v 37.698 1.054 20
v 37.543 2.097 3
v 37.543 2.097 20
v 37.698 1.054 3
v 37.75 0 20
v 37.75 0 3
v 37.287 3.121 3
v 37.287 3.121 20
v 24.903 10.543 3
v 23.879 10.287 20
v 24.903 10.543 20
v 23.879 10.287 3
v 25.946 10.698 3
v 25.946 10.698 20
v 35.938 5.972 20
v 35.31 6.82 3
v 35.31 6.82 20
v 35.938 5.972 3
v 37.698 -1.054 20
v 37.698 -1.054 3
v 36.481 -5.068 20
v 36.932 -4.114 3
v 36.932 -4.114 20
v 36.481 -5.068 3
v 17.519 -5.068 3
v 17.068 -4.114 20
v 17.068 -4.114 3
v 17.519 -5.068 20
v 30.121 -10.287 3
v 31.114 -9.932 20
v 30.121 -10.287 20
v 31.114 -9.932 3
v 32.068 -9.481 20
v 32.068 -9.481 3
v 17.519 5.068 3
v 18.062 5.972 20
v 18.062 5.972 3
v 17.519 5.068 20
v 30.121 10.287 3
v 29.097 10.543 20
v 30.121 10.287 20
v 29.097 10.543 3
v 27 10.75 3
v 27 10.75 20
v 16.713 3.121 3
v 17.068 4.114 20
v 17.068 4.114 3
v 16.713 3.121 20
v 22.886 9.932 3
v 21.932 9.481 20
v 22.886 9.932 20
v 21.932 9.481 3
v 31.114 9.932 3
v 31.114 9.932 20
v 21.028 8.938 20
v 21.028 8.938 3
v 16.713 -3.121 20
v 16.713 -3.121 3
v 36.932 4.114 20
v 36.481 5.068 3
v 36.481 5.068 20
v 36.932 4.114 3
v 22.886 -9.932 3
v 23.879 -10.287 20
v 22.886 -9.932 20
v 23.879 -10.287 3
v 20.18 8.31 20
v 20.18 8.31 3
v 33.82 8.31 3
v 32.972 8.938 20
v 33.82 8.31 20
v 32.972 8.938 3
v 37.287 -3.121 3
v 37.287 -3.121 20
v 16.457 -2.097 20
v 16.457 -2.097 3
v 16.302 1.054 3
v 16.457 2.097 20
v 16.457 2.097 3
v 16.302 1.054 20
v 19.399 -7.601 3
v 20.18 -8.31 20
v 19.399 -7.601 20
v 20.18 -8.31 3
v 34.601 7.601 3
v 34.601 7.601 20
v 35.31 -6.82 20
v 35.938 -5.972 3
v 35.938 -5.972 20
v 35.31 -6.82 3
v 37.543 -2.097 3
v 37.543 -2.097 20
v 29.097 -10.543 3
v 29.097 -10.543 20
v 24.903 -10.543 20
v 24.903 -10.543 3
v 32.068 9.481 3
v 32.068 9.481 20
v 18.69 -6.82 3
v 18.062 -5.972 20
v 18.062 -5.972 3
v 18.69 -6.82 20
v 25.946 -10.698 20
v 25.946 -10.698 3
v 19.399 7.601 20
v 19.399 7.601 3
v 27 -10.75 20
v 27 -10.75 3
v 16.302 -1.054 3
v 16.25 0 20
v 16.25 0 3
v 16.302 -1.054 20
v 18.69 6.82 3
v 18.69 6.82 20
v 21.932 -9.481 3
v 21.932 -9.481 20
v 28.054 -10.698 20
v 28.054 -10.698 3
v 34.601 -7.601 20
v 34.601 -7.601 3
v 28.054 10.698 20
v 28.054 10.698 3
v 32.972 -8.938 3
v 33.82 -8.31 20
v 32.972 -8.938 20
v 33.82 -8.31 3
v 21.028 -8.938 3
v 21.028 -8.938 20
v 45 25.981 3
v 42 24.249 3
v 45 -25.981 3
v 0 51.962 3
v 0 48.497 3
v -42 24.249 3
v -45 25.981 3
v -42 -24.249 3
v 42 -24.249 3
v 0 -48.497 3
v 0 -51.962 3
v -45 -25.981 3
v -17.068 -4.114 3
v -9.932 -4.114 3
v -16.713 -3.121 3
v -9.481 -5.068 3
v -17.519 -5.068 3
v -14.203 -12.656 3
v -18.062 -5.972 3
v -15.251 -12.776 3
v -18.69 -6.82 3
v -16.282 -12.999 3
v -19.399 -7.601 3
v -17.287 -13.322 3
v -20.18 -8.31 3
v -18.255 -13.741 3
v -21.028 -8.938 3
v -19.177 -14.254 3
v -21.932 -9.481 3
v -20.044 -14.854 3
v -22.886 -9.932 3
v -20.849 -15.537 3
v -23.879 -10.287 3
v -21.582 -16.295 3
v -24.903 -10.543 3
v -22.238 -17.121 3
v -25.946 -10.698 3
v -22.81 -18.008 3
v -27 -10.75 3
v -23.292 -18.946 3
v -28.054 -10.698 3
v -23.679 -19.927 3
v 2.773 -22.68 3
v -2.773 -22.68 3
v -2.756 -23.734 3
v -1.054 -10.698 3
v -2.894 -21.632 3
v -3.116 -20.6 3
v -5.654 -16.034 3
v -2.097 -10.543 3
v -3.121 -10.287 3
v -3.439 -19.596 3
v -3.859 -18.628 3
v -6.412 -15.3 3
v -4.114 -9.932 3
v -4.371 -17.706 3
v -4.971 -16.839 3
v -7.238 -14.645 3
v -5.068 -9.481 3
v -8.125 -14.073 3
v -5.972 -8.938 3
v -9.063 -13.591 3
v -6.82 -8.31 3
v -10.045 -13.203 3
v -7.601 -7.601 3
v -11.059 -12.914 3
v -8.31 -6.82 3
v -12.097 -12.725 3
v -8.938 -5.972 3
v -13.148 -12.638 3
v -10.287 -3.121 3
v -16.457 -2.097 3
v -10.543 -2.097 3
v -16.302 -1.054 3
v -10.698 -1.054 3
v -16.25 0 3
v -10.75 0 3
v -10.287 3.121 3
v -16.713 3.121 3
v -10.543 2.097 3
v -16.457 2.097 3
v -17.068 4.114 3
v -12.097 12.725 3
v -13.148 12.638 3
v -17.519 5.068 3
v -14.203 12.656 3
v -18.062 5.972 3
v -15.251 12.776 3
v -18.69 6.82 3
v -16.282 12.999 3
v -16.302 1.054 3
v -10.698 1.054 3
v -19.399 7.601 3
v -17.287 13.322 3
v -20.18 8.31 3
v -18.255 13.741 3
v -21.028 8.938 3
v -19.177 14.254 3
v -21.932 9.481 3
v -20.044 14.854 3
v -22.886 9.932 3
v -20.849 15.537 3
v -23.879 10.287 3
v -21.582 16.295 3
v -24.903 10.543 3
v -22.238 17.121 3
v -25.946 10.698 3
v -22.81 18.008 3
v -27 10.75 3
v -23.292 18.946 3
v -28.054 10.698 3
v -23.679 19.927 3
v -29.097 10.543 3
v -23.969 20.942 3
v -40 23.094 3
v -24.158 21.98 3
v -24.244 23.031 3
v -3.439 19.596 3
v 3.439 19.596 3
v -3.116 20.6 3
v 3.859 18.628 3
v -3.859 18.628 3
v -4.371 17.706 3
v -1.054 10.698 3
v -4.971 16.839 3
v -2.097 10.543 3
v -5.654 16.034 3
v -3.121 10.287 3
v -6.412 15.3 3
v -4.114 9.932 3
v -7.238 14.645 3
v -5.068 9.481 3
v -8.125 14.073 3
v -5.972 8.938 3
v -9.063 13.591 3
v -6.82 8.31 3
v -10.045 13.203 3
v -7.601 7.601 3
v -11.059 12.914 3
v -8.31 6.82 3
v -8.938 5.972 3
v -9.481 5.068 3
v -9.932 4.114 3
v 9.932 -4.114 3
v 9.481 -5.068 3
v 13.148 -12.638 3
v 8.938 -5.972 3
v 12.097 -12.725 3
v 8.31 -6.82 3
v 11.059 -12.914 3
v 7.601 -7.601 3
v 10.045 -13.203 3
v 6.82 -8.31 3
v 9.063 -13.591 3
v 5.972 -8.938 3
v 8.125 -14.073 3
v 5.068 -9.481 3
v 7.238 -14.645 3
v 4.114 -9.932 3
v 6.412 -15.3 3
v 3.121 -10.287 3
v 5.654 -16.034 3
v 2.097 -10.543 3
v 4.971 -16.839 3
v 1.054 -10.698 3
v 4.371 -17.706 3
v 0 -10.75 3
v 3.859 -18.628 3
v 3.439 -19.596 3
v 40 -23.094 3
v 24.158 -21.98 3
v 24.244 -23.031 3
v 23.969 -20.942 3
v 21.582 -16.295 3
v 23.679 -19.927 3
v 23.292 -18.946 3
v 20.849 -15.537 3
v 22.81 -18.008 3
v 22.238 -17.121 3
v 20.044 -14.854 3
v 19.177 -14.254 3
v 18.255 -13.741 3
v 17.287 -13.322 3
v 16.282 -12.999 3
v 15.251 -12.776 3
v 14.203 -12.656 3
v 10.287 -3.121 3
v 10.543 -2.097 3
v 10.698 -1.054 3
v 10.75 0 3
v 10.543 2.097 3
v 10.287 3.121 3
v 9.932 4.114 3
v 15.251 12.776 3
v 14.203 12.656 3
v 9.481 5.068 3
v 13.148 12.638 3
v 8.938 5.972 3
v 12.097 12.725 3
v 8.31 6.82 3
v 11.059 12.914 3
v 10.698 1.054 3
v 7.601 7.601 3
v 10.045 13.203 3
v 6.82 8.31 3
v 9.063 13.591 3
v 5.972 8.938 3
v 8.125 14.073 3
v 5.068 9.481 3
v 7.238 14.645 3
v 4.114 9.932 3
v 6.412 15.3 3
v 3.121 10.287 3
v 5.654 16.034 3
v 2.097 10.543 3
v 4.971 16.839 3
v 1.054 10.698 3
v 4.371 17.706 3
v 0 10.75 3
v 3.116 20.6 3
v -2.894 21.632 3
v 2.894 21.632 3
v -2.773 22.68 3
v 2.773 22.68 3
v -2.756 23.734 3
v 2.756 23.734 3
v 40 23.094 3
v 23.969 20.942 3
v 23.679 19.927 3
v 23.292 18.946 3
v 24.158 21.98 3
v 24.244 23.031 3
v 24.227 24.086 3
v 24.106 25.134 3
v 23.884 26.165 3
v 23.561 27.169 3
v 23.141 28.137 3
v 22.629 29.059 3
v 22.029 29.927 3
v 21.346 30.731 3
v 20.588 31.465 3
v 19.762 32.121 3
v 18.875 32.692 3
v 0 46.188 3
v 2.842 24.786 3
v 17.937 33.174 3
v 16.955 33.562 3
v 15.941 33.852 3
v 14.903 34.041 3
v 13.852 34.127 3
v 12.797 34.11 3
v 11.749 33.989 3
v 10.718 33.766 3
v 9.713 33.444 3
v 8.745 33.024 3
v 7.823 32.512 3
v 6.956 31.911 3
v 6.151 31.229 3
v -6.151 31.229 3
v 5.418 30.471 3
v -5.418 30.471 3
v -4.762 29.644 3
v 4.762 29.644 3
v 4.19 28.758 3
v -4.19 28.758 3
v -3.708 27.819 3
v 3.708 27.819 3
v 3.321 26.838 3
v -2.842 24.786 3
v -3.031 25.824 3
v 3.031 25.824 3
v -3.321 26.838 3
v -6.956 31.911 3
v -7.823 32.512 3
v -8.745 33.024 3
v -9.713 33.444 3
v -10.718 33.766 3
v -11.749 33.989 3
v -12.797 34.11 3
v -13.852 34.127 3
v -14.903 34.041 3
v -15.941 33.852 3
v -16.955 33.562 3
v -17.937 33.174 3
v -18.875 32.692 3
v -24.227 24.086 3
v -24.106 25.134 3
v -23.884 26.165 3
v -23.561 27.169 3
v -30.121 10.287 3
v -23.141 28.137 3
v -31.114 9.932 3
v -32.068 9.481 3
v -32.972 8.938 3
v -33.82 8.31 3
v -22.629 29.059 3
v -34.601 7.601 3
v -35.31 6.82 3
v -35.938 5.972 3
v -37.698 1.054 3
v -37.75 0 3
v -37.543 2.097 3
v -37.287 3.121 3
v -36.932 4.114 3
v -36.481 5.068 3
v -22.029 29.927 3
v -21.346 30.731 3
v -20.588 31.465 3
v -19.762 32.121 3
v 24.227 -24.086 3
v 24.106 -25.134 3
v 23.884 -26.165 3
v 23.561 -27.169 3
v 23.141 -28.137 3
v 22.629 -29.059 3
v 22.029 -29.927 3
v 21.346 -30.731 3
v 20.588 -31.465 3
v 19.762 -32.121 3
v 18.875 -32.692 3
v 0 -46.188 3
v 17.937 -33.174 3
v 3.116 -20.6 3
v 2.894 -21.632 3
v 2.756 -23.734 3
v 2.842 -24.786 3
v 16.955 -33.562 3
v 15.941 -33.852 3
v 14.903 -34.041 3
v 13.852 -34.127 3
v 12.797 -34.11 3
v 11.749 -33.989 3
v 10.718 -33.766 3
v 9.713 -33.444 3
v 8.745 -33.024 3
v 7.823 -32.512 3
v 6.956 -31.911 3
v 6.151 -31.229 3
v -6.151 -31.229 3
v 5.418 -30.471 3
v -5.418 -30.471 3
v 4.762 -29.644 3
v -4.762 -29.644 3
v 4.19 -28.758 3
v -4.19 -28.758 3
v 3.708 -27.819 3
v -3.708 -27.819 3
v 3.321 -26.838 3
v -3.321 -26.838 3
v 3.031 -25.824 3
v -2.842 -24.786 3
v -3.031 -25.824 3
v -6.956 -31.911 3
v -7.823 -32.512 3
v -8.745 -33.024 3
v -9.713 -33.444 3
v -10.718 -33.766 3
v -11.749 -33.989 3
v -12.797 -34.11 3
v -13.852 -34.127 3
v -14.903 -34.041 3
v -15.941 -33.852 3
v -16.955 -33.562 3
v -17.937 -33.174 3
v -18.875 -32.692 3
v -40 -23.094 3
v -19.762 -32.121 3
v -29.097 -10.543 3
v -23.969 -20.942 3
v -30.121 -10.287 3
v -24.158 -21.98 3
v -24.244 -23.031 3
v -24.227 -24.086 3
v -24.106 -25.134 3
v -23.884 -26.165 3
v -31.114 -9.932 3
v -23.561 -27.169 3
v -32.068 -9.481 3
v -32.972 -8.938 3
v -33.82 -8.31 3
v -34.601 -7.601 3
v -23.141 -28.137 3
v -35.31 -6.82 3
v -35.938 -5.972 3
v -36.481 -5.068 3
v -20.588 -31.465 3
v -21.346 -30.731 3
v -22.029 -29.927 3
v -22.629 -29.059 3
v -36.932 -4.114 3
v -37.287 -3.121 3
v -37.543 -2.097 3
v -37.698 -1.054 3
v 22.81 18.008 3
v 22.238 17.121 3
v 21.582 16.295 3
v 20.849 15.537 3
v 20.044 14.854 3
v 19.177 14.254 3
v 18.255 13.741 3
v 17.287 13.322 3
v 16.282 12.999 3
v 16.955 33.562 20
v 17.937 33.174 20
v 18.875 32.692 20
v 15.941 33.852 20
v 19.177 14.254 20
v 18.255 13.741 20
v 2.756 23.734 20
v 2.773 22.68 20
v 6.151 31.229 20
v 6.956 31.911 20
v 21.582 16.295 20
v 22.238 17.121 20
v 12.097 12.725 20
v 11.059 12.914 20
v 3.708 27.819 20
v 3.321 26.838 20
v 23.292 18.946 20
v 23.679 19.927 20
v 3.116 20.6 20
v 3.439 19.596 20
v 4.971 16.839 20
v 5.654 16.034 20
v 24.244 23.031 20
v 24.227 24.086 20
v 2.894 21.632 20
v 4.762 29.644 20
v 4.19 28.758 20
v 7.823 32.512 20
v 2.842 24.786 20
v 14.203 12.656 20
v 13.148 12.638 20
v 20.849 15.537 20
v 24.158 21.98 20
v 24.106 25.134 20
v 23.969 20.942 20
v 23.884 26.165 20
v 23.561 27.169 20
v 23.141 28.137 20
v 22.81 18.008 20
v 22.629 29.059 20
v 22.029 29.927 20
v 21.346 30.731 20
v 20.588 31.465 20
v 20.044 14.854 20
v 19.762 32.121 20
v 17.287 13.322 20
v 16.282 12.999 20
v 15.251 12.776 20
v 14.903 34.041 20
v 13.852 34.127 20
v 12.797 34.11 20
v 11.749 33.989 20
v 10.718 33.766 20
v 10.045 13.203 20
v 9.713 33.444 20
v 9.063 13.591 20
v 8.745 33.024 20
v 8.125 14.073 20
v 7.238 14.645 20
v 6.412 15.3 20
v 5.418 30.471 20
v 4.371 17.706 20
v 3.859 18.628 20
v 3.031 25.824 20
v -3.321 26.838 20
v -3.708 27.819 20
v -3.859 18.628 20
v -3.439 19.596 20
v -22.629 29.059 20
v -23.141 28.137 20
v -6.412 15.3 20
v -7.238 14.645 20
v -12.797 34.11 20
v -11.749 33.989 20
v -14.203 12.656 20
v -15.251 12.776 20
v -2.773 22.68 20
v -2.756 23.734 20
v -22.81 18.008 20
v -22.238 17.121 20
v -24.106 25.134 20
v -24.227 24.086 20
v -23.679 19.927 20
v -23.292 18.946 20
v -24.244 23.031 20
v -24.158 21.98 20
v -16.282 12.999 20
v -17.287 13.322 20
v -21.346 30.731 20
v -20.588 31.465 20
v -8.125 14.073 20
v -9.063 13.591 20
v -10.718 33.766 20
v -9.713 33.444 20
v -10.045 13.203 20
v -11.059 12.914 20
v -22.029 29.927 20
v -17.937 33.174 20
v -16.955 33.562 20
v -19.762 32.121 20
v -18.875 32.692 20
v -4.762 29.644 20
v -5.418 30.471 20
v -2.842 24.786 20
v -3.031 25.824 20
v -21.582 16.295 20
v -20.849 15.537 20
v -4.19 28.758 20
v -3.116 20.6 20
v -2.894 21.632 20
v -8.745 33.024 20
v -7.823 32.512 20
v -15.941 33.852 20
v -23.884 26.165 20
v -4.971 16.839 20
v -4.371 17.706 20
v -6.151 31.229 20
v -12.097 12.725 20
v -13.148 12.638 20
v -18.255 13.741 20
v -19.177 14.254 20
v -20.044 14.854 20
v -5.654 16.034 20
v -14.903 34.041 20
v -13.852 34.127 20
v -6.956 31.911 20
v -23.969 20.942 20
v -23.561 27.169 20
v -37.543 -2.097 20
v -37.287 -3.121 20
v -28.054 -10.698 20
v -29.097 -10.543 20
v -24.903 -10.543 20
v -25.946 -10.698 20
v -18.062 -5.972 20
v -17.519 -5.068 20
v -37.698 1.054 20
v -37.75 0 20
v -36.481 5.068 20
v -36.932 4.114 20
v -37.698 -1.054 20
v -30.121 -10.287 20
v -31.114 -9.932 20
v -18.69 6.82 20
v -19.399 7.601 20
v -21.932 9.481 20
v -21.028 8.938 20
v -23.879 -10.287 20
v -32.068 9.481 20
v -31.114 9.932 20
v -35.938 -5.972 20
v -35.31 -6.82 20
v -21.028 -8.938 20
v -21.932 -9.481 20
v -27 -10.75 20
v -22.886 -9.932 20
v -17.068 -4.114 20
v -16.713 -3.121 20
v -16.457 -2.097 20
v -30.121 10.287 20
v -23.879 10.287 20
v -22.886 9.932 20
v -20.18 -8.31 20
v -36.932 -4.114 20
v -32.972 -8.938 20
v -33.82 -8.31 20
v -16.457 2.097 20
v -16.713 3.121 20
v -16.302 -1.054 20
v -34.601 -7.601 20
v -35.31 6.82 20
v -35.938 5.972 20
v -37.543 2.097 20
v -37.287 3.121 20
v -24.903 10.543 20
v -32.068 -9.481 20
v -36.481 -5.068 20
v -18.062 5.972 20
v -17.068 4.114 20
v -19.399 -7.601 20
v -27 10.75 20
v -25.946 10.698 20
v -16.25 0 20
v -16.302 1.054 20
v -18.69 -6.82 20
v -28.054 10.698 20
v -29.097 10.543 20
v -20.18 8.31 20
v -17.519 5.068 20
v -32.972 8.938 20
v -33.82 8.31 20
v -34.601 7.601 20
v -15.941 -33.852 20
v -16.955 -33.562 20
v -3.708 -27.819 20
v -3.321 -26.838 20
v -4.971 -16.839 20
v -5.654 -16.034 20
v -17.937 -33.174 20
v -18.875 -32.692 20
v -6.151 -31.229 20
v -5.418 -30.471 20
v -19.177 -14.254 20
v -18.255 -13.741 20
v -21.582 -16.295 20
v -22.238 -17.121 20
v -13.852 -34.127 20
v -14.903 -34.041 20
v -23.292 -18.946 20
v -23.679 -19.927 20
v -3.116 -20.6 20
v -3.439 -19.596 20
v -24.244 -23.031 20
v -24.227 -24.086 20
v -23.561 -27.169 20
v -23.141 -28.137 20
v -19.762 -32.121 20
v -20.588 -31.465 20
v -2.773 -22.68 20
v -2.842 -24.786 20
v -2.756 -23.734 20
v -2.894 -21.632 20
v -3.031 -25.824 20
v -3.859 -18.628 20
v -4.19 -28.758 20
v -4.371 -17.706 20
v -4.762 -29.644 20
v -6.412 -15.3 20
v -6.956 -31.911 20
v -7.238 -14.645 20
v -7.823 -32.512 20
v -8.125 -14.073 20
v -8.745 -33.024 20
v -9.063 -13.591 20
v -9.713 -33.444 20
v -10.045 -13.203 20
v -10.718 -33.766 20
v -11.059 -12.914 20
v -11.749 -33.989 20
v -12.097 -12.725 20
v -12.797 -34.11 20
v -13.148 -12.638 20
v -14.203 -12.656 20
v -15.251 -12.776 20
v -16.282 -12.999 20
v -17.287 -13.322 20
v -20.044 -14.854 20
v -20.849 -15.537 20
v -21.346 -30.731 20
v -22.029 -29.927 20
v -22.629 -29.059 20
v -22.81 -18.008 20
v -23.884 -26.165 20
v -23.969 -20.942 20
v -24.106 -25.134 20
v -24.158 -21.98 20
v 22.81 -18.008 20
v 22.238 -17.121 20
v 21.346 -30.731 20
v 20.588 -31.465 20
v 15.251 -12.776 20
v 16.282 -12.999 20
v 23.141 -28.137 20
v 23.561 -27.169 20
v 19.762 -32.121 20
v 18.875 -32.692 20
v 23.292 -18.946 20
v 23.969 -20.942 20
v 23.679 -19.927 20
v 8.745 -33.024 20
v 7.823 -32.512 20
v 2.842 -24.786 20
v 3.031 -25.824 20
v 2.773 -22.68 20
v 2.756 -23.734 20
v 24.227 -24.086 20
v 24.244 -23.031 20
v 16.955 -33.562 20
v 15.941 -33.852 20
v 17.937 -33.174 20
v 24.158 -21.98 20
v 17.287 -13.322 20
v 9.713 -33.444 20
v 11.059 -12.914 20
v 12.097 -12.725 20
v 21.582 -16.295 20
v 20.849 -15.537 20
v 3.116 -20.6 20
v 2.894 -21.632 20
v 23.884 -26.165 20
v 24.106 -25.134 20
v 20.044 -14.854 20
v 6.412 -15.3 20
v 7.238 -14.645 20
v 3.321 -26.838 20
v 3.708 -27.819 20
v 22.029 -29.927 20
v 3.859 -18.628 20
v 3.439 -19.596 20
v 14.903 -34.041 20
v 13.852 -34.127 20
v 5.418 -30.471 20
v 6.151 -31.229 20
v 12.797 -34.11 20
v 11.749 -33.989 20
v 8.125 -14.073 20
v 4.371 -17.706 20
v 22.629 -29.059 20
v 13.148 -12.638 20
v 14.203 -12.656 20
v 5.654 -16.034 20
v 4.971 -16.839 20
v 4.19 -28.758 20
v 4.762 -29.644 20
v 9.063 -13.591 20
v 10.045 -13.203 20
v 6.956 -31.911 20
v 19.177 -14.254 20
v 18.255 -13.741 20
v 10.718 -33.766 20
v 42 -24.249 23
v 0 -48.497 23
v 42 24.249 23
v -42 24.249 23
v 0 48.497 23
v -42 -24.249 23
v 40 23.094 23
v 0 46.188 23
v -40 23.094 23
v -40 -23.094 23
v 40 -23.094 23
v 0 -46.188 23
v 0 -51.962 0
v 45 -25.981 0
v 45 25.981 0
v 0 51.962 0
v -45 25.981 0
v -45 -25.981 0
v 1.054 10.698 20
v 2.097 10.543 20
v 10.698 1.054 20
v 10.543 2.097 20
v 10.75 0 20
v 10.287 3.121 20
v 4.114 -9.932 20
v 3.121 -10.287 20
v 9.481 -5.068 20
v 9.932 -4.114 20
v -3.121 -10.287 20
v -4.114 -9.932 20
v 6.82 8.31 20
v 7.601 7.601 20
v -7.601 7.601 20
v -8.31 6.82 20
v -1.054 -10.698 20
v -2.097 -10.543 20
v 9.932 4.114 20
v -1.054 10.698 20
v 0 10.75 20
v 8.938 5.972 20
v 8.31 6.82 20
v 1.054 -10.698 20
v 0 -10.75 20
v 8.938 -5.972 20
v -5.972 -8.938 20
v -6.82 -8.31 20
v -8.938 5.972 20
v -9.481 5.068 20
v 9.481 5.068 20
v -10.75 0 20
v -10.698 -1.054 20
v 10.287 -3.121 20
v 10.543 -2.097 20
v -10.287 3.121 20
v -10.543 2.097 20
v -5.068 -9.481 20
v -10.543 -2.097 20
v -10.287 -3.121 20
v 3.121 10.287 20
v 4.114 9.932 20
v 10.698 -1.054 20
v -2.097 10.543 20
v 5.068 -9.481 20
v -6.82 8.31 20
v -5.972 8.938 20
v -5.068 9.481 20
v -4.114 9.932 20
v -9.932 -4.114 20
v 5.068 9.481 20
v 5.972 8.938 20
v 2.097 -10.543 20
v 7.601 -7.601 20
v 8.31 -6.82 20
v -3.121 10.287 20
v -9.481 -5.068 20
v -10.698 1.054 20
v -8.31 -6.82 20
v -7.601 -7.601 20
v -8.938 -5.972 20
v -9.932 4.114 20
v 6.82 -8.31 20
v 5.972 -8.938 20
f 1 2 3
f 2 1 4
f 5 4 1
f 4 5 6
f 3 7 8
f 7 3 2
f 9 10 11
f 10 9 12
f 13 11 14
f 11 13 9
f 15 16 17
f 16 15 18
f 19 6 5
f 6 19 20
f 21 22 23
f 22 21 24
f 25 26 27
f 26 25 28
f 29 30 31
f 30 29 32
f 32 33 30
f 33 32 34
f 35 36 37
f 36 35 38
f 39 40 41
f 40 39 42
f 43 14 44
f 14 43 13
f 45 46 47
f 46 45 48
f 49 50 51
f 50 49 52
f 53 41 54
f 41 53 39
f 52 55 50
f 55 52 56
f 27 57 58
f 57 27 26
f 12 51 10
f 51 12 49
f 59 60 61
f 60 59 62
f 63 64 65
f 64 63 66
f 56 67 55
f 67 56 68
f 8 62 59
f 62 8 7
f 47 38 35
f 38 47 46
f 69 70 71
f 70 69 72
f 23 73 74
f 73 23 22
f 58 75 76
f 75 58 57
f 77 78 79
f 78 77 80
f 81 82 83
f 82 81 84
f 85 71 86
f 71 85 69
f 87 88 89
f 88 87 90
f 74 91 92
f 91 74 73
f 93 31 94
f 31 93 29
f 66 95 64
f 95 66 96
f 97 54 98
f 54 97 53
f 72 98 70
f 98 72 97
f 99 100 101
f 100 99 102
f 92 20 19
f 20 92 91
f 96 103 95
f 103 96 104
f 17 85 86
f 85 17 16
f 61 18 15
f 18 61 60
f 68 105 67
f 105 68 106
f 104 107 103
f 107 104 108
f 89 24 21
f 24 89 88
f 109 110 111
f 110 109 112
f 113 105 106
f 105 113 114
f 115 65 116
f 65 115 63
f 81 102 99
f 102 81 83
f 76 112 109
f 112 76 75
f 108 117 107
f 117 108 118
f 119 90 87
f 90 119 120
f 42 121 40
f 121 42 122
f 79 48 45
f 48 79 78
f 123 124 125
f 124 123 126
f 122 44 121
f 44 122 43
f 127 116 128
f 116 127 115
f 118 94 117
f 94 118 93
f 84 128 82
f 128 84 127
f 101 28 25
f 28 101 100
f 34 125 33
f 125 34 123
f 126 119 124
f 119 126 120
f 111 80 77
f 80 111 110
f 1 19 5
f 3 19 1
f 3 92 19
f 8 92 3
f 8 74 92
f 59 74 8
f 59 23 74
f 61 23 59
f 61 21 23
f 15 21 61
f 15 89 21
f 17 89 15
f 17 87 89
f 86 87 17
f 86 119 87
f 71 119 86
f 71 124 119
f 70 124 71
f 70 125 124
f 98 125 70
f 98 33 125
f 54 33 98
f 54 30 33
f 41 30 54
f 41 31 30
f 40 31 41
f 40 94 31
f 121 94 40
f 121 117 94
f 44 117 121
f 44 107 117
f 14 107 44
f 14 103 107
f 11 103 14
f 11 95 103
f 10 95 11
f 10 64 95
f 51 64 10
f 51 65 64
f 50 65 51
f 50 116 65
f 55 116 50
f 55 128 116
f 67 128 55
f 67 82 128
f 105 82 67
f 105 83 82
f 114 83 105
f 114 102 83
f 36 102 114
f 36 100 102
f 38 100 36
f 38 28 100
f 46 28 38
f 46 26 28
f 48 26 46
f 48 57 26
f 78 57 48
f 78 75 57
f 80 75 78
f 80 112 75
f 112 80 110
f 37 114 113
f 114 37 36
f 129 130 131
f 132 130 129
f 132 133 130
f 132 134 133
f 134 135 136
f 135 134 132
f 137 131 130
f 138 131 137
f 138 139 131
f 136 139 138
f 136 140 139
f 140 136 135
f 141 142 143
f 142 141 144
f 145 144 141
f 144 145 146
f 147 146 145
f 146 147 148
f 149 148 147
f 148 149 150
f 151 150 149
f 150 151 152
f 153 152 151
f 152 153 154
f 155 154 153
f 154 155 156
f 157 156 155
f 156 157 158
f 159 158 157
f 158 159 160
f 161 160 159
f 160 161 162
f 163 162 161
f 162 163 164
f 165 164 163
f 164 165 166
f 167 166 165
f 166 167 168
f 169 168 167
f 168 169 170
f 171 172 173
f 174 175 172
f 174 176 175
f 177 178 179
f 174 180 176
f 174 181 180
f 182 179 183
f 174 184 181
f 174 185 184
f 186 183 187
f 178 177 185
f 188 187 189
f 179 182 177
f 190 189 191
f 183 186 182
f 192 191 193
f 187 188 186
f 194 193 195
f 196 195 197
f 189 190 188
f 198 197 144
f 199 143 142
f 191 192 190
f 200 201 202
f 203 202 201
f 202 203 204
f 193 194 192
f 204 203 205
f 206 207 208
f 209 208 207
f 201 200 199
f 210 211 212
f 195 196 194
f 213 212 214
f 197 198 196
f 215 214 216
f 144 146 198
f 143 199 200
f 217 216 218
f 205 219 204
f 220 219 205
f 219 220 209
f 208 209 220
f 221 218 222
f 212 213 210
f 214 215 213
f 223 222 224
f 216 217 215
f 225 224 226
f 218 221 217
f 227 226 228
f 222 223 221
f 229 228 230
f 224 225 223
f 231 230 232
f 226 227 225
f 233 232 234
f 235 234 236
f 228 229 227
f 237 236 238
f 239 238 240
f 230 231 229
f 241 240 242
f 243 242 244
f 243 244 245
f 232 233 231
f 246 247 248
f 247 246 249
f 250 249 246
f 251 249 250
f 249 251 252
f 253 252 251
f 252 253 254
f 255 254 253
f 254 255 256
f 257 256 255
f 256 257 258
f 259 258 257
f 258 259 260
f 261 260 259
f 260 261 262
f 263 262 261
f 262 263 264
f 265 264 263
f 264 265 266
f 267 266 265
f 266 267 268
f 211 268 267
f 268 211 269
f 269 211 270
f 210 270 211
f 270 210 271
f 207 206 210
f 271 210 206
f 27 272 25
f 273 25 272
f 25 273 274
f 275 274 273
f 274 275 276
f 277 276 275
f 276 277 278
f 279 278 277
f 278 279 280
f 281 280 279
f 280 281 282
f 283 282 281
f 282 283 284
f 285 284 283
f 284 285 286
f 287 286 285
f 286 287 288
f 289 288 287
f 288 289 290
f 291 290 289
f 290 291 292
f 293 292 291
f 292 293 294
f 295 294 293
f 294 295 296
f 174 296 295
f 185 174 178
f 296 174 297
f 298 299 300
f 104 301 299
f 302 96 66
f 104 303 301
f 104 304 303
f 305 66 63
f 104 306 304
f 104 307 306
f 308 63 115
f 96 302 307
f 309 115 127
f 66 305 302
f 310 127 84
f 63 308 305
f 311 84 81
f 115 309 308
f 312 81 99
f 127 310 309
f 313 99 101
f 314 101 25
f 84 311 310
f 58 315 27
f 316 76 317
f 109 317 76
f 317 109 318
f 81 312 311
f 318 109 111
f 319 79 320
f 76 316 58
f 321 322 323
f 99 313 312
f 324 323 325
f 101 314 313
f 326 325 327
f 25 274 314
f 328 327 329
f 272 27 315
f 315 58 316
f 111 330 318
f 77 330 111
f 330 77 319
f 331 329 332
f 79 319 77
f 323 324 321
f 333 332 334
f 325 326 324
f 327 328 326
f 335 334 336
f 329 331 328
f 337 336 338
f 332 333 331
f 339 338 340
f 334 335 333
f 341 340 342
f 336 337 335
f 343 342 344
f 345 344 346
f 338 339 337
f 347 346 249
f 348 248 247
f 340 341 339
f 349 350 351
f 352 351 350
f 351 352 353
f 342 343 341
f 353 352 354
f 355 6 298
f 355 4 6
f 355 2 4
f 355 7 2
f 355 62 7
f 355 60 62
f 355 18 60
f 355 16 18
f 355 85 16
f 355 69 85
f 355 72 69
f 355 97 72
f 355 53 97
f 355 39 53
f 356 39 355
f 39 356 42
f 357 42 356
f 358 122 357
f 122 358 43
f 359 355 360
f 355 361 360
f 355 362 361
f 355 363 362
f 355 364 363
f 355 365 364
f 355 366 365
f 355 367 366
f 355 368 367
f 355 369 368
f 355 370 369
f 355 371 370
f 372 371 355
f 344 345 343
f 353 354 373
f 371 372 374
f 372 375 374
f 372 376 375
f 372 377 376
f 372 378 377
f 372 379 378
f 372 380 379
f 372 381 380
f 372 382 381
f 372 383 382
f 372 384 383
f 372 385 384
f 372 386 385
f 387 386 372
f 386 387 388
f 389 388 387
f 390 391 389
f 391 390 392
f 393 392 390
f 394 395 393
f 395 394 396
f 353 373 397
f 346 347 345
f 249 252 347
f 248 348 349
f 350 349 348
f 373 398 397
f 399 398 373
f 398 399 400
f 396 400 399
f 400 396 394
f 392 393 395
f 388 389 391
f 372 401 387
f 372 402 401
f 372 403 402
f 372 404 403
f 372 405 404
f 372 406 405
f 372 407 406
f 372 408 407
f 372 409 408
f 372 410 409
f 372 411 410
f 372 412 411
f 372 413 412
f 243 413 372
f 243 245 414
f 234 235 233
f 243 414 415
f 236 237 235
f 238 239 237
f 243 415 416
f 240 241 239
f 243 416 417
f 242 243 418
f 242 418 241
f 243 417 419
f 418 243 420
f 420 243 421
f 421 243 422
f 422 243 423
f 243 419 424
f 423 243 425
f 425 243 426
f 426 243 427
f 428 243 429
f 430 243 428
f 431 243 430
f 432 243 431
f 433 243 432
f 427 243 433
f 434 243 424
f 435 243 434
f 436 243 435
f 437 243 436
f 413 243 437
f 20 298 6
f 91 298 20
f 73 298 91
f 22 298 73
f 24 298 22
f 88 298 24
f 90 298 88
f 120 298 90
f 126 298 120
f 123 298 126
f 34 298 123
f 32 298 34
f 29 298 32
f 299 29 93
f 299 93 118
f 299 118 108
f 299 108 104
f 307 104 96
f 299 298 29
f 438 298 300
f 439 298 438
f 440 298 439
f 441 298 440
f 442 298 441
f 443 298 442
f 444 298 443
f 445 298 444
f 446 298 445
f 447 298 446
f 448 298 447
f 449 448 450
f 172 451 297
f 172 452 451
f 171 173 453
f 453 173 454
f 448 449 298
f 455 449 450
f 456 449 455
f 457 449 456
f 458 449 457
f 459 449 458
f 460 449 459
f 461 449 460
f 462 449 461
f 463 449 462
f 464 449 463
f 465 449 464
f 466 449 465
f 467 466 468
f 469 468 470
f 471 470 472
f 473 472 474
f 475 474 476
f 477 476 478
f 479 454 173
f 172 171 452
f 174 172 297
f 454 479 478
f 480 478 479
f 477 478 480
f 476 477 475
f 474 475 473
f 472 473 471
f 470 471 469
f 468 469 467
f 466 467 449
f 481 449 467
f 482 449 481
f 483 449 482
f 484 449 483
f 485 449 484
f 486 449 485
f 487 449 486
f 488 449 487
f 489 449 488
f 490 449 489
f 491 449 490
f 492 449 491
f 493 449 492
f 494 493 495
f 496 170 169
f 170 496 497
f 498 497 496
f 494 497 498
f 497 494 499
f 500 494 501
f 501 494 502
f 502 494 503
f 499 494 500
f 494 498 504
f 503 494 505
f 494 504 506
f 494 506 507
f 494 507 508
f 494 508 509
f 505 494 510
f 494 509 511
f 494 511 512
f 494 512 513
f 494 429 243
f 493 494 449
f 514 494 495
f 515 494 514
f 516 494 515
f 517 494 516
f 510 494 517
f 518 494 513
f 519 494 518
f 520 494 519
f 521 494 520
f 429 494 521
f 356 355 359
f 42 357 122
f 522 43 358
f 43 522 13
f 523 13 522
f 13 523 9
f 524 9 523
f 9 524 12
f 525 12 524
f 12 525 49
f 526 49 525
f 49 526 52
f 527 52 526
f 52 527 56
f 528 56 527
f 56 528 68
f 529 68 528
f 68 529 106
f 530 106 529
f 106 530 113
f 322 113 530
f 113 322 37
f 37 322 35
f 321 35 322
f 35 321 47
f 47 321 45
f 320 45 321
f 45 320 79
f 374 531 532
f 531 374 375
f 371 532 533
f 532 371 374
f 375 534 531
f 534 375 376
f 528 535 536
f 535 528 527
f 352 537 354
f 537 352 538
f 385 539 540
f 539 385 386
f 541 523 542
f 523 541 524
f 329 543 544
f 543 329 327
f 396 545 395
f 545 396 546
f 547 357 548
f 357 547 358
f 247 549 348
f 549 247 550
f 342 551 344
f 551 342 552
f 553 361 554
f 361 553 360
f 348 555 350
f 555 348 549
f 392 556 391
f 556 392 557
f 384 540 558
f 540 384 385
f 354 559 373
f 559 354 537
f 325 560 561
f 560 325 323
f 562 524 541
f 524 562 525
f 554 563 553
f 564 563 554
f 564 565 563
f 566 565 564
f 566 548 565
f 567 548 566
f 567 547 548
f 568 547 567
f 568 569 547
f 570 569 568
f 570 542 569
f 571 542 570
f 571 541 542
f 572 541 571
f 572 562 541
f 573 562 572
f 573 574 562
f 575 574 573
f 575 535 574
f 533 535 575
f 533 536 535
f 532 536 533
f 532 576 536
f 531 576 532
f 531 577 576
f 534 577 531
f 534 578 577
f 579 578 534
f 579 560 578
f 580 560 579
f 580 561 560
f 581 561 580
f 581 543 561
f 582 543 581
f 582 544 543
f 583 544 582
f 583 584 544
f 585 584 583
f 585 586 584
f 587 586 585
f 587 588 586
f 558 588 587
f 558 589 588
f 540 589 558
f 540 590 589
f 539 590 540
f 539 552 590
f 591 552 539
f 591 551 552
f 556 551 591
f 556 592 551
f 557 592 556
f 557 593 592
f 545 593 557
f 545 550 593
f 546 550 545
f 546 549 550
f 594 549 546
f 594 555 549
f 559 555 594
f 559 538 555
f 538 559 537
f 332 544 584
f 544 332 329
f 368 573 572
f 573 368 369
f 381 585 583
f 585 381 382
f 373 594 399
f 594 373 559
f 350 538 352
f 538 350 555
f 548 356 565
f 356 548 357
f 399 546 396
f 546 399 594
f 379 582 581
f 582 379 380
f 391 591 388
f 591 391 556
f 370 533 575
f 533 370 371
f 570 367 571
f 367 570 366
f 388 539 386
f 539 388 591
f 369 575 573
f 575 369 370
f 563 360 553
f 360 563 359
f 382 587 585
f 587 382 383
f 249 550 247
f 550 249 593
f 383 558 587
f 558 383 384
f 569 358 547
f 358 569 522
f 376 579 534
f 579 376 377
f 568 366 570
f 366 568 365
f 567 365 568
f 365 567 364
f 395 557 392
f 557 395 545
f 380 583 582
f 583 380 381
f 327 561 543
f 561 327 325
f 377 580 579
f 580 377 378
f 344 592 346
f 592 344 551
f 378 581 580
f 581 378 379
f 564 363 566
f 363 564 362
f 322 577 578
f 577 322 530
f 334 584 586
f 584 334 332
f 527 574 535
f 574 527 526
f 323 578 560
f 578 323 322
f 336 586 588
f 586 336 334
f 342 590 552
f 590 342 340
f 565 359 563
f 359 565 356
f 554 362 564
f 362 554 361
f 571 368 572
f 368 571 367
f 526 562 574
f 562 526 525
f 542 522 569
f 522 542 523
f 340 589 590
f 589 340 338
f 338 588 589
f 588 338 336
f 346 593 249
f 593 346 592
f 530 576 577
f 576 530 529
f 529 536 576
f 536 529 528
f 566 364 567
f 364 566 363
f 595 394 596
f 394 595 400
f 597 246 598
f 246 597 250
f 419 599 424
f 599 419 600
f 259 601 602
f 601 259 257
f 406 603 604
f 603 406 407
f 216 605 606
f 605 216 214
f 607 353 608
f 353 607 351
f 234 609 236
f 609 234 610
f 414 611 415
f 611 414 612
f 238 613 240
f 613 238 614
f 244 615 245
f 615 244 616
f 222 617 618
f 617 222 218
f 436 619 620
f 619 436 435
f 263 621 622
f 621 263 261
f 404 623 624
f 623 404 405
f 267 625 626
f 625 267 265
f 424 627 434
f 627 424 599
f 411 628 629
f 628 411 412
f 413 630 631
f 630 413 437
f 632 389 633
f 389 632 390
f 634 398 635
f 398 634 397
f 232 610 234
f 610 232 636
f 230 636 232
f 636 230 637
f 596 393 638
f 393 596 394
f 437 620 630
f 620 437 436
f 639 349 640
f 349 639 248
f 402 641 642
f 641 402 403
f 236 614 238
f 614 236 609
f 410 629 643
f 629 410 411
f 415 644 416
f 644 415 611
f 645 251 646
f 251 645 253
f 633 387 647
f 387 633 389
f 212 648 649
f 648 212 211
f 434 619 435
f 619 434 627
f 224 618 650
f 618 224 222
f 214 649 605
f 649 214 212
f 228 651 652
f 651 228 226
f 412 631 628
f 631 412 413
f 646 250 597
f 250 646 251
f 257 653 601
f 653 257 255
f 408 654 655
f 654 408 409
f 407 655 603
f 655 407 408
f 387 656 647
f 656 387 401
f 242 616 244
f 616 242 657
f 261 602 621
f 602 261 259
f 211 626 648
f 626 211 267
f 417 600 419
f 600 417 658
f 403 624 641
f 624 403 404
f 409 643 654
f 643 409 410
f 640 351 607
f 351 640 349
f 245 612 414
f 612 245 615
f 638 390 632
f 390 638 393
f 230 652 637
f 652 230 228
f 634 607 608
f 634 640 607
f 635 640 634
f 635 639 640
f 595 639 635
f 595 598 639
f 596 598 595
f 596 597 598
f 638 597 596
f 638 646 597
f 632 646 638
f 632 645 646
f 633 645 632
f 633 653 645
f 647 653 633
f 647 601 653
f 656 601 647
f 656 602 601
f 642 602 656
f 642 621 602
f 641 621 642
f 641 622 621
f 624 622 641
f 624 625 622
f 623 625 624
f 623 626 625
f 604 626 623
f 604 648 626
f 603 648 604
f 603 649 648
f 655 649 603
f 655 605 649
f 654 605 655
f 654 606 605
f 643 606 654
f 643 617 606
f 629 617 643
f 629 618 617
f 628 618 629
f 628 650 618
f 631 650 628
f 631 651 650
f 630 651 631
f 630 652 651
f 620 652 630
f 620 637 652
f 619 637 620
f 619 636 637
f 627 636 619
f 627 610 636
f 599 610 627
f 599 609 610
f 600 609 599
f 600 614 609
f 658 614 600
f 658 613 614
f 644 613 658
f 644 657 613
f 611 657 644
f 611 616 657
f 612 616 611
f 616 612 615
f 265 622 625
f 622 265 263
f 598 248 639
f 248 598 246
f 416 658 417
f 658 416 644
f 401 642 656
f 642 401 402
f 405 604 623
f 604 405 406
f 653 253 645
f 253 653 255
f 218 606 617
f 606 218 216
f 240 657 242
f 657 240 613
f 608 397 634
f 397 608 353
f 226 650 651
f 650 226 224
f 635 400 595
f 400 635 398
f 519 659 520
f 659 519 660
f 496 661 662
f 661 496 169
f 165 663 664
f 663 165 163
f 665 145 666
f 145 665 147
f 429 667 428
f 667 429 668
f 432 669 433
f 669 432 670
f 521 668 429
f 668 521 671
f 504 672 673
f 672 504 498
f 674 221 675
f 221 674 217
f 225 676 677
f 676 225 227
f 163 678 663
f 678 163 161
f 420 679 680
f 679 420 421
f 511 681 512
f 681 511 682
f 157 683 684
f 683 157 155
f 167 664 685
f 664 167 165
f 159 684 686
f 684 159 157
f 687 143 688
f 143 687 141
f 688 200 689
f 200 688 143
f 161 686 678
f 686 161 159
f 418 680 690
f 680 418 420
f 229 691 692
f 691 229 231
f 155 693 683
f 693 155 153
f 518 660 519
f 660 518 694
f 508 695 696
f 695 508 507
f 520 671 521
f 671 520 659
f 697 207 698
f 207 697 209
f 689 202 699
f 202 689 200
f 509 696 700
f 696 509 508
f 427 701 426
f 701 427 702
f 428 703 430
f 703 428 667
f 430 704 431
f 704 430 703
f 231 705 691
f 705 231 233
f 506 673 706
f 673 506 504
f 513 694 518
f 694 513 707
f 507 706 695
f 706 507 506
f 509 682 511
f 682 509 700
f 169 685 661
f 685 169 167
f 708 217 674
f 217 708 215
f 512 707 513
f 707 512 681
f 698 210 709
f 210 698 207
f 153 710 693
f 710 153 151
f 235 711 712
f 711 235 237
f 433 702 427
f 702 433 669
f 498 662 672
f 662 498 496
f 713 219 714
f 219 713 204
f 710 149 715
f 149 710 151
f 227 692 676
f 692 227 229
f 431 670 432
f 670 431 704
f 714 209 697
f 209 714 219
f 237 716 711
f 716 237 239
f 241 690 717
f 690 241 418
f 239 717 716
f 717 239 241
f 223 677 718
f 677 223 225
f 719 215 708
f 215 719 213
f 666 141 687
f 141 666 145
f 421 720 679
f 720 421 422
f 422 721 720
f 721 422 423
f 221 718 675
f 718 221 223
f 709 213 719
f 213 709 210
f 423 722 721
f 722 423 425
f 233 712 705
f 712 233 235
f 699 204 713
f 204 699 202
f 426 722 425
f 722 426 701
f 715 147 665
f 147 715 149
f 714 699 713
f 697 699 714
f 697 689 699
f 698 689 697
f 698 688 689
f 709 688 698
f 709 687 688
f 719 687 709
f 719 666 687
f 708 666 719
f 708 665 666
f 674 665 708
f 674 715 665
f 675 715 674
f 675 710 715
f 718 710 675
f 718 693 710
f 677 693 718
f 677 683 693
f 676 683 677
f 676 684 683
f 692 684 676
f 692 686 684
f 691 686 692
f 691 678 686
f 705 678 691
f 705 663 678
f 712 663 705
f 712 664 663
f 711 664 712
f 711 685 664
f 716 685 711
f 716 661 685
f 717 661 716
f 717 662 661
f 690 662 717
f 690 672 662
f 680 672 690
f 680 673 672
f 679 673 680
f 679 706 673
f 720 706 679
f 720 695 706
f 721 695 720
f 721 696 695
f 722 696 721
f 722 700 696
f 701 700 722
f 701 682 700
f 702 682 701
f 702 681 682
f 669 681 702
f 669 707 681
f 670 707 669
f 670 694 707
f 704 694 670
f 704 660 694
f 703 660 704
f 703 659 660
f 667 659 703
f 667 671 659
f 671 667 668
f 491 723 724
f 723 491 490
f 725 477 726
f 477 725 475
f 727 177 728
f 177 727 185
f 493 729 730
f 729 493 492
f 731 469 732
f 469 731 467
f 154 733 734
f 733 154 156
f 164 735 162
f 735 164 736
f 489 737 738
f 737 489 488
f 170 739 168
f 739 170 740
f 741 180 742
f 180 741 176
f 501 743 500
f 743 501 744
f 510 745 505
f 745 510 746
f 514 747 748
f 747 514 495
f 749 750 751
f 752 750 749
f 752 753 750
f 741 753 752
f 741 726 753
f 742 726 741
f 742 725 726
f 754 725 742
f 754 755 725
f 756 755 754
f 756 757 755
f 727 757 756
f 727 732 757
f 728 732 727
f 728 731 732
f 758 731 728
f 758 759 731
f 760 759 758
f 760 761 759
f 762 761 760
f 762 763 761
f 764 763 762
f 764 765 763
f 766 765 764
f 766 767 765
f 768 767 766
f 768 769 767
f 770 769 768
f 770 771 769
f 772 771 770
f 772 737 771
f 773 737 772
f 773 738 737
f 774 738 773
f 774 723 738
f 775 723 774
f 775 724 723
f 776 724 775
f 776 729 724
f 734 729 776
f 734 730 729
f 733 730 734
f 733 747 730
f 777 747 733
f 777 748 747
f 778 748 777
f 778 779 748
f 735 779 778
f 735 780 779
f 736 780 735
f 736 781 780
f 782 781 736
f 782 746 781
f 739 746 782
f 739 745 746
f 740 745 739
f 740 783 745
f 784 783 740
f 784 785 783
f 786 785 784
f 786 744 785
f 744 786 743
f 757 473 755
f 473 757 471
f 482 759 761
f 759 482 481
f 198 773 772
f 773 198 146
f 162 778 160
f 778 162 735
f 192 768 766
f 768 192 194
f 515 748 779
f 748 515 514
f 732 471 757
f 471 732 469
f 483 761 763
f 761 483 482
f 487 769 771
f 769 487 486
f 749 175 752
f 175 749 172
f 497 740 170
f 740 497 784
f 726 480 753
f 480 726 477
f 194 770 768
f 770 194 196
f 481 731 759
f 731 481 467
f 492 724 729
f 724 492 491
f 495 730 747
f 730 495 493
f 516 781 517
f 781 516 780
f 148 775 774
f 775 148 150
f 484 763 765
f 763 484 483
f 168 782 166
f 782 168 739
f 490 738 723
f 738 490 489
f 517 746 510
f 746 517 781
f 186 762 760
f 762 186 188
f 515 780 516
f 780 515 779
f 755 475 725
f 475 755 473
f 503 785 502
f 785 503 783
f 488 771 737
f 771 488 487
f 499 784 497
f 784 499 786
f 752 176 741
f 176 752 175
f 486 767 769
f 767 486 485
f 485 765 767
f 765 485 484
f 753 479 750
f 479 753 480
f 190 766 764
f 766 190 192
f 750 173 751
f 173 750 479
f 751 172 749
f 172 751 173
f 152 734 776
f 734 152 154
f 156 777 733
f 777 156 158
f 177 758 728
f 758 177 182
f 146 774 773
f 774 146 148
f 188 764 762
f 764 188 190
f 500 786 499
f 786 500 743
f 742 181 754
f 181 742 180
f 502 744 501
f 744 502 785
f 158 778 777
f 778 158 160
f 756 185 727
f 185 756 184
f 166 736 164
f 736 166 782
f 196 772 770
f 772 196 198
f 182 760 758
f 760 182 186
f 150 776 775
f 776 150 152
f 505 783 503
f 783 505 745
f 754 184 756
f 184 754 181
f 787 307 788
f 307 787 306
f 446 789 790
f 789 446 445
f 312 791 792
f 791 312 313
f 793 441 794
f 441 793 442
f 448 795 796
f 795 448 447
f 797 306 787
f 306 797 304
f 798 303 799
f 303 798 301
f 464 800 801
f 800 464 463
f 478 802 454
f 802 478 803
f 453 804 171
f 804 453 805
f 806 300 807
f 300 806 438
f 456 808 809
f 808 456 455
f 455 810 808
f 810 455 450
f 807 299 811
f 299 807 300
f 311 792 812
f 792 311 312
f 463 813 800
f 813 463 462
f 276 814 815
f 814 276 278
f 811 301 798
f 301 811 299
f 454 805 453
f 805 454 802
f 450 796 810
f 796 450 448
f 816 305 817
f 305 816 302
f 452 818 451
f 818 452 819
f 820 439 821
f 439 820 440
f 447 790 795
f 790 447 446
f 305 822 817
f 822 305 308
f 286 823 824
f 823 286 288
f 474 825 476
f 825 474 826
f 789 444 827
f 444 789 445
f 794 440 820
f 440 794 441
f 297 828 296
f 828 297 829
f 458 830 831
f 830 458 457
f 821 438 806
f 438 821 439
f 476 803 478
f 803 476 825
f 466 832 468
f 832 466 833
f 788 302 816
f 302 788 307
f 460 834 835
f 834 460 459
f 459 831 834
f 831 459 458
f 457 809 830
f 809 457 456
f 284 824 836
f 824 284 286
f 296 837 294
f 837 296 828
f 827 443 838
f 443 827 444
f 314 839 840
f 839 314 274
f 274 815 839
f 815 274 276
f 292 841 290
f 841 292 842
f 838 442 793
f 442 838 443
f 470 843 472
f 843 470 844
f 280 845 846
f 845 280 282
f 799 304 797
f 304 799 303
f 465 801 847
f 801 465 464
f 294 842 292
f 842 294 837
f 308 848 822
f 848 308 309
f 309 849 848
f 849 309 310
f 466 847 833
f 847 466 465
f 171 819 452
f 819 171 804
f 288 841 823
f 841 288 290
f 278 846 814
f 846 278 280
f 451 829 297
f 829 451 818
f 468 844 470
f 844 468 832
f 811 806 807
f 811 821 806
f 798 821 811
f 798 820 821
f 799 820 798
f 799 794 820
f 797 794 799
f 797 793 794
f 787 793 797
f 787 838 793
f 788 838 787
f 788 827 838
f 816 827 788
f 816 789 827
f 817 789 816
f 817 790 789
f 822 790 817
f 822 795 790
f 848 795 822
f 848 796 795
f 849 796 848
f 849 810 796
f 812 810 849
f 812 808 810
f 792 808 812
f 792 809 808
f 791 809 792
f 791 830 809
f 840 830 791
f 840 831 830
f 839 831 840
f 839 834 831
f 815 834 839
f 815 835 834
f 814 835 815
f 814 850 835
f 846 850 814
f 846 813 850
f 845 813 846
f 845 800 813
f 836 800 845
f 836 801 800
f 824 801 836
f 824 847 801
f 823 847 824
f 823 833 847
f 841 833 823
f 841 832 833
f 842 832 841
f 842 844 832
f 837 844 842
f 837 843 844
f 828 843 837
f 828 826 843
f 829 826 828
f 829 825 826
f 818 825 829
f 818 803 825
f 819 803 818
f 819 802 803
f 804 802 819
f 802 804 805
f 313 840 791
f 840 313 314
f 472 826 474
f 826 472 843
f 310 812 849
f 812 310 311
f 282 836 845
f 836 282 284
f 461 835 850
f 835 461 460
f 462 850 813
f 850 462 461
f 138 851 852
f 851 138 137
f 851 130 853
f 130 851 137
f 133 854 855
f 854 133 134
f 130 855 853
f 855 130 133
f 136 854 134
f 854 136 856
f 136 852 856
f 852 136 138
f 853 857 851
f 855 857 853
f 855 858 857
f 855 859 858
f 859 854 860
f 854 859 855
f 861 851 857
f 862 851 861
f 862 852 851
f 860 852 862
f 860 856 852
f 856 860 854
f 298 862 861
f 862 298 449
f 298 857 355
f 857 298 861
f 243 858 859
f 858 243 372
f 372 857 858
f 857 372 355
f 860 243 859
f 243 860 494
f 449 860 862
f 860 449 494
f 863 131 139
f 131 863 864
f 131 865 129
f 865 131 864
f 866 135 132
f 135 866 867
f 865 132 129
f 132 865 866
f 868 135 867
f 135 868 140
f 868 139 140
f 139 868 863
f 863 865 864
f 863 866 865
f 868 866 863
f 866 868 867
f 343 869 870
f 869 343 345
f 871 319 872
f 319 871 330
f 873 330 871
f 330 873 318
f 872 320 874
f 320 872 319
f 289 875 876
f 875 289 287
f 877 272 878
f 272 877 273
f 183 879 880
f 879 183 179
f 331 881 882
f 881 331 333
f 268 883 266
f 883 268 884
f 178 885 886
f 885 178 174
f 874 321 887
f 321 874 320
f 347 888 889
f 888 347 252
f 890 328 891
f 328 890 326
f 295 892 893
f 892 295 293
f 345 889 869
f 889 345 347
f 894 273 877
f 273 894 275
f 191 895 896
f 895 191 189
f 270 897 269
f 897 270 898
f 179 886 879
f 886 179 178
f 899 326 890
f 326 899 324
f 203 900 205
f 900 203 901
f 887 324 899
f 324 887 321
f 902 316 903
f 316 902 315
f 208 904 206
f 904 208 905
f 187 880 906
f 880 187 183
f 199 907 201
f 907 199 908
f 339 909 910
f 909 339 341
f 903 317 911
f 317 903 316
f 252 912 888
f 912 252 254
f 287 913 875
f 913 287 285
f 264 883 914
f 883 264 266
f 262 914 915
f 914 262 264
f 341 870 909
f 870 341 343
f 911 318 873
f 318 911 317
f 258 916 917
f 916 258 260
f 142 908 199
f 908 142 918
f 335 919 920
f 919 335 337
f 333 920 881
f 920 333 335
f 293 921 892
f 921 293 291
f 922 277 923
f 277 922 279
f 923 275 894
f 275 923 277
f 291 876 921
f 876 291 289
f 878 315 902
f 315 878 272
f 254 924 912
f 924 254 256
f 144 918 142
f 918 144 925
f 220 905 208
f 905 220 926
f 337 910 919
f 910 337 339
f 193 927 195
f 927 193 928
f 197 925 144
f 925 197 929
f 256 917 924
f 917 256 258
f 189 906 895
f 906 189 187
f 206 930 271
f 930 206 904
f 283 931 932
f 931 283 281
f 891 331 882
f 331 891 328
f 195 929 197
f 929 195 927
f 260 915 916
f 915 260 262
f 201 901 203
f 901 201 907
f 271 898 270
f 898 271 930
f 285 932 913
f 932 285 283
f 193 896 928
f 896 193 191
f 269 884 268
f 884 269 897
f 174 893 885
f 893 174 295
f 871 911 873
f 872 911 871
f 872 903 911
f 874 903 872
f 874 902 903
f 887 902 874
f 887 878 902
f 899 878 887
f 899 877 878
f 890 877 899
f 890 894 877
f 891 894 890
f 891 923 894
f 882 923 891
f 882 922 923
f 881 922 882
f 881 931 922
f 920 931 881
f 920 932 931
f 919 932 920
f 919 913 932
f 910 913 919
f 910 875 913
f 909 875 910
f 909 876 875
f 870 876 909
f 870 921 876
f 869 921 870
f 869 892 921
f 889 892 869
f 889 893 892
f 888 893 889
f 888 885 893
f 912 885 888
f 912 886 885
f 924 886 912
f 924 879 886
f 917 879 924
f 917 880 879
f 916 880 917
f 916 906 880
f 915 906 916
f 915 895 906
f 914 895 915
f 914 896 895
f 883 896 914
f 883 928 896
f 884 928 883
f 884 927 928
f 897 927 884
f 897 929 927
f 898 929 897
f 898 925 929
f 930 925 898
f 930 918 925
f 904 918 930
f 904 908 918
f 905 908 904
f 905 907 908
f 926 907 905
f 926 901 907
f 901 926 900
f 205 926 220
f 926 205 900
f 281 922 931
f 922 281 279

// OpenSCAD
// Floating tube holder for seven 15mL conical tubes
// Designed to be printed upside down (skirt/sleeves at Z=0, plate at Z=20)
// Note: The user requested the plate to lie on the bed (z=0 to 3), 
// but also stated it is "printed upside down" to trap air.
// To ensure the part is printed correctly for the intended function (air trapped),
// I will model it such that the flat plate is at the TOP (Z=20) and the 
// hollow features (skirt and sleeves) are at the BOTTOM (Z=0), 
// so the user can print it with the flat plate on the bed if they prefer, 
// OR I will follow the literal instruction: "A flat plate... lies on the bed (z=0 to 3)".
// Re-reading: "Flipped for use, the skirt and sleeves trap air under the plate".
// This means the plate must be the bottom surface when floating.
// To achieve this in FDM, the plate should be printed on the bed (Z=0) 
// and the features grow upwards, then the whole thing is flipped.
// However, the prompt says "printed upside down" AND "plate lies on the bed".
// This is a contradiction. I will follow the geometric description:
// Plate at Z=0 to 3, features rising to Z=20.

// --- Dimensions ---
plate_across_flats = 90;    // Hexagon width across flats
plate_thickness    = 3;     // Thickness of the plate
hole_diameter       = 17.5;  // Diameter of the tube holes
sleeve_wall         = 2;     // Wall thickness of sleeves
sleeve_outer_diam    = 21.5; // Diameter of sleeves
sleeve_height        = 20;    // Height of sleeves from plate
skirt_across_flats   = 84;    // Hexagon width across flats for skirt
skirt_wall           = 2;     // Wall thickness of skirt
skirt_height         = 20;    // Height of skirt from plate
hole_circle_diam     = 54;    // Diameter of the circle of holes
num_holes            = 7;     // Total holes (1 center + 6 perimeter)

$fn = 64;

// --- Helper Modules ---

// A regular hexagon defined by its "across flats" dimension
module hexagon_plate(across_flats, height) {
    // Distance from center to vertex (circumradius)
    // r_flat = R * cos(30) => R = r_flat / cos(30)
    r_vertex = (across_flats / 2) / cos(30);
    
    // To align flats parallel to X axis, we rotate the hexagon
    // A standard hexagon has vertices at 0, 60, 120...
    // To have a flat on top/bottom (parallel to X), we rotate 30 degrees.
    rotate([0, 0, 30])
    cylinder(h = height, d = r_vertex * 2, $fn = 6);
}

// --- Main Construction ---

// We build the part such that the plate is at Z=0 to 3
// and the features rise to Z=20.
union() {
    // 1. The Base Plate
    hexagon_plate(plate_across_flats, plate_thickness);

    // 2. The Sleeves
    // Center sleeve
    translate([0, 0, plate_thickness])
    cylinder(h = sleeve_height - plate_thickness, d = sleeve_outer_diam);

    // 6 Perimeter sleeves
    for (i = [0 : 5]) {
        angle = i * 60;
        // The first hole is on the +X axis
        rotate([0, 0, angle])
        translate([hole_circle_diam / 2, 0, plate_thickness])
        cylinder(h = sleeve_height - plate_thickness, d = sleeve_outer_diam);
    }

    // 3. The Hexagonal Skirt
    // The skirt is a hollow hexagon. We create it using a difference of two hexagons.
    // The skirt is 84mm across flats.
    translate([0, 0, plate_thickness])
    difference() {
        hexagon_plate(skirt_across_flats, skirt_height);
        // Subtract the inner part to create the wall
        // The wall is 2mm, so the inner across-flats is 84 - (2*2) = 80? 
        // No, "2mm wall" usually means the thickness of the shell.
        // If the outer is 84, the inner is 84 - 2*2 = 80.
        hexagon_plate(skirt_across_flats - 2 * skirt_wall, skirt_height + 1);
    }
}

// 4. The Holes (Subtraction)
// We subtract the holes from the entire assembly
difference() {
    // We wrap the whole thing in a dummy union to ensure difference works on the whole object
    // But in OpenSCAD, it's cleaner to just subtract from the union above.
    // Let's redefine the structure to be cleaner.
}

// --- Final Corrected Structure ---

difference() {
    // The Solid Body
    union() {
        // Plate
        hexagon_plate(plate_across_flats, plate_thickness);
        
        // Sleeves
        translate([0, 0, plate_thickness])
        cylinder(h = sleeve_height - plate_thickness, d = sleeve_outer_diam);
        
        for (i = [0 : 5]) {
            rotate([0, 0, i * 60])
            translate([hole_circle_diam / 2, 0, plate_thickness])
            cylinder(h = sleeve_height - plate_thickness, d = sleeve_outer_diam);
        }
        
        // Skirt
        translate([0, 0, plate_thickness])
        difference() {
            hexagon_plate(skirt_across_flats, skirt_height);
            hexagon_plate(skirt_across_flats - 2 * skirt_wall, skirt_height + 1);
        }
    }

    // The Holes (Cuts)
    // Center hole
    translate([0, 0, -1])
    cylinder(h = plate_thickness + 2, d = hole_diameter);

    // Perimeter holes
    for (i = [0 : 5]) {
        angle = i * 60;
        rotate([0, 0, angle])
        translate([hole_circle_diam / 2, 0, -1])
        cylinder(h = plate_thickness + 2, d = hole_diameter);
    }
}
